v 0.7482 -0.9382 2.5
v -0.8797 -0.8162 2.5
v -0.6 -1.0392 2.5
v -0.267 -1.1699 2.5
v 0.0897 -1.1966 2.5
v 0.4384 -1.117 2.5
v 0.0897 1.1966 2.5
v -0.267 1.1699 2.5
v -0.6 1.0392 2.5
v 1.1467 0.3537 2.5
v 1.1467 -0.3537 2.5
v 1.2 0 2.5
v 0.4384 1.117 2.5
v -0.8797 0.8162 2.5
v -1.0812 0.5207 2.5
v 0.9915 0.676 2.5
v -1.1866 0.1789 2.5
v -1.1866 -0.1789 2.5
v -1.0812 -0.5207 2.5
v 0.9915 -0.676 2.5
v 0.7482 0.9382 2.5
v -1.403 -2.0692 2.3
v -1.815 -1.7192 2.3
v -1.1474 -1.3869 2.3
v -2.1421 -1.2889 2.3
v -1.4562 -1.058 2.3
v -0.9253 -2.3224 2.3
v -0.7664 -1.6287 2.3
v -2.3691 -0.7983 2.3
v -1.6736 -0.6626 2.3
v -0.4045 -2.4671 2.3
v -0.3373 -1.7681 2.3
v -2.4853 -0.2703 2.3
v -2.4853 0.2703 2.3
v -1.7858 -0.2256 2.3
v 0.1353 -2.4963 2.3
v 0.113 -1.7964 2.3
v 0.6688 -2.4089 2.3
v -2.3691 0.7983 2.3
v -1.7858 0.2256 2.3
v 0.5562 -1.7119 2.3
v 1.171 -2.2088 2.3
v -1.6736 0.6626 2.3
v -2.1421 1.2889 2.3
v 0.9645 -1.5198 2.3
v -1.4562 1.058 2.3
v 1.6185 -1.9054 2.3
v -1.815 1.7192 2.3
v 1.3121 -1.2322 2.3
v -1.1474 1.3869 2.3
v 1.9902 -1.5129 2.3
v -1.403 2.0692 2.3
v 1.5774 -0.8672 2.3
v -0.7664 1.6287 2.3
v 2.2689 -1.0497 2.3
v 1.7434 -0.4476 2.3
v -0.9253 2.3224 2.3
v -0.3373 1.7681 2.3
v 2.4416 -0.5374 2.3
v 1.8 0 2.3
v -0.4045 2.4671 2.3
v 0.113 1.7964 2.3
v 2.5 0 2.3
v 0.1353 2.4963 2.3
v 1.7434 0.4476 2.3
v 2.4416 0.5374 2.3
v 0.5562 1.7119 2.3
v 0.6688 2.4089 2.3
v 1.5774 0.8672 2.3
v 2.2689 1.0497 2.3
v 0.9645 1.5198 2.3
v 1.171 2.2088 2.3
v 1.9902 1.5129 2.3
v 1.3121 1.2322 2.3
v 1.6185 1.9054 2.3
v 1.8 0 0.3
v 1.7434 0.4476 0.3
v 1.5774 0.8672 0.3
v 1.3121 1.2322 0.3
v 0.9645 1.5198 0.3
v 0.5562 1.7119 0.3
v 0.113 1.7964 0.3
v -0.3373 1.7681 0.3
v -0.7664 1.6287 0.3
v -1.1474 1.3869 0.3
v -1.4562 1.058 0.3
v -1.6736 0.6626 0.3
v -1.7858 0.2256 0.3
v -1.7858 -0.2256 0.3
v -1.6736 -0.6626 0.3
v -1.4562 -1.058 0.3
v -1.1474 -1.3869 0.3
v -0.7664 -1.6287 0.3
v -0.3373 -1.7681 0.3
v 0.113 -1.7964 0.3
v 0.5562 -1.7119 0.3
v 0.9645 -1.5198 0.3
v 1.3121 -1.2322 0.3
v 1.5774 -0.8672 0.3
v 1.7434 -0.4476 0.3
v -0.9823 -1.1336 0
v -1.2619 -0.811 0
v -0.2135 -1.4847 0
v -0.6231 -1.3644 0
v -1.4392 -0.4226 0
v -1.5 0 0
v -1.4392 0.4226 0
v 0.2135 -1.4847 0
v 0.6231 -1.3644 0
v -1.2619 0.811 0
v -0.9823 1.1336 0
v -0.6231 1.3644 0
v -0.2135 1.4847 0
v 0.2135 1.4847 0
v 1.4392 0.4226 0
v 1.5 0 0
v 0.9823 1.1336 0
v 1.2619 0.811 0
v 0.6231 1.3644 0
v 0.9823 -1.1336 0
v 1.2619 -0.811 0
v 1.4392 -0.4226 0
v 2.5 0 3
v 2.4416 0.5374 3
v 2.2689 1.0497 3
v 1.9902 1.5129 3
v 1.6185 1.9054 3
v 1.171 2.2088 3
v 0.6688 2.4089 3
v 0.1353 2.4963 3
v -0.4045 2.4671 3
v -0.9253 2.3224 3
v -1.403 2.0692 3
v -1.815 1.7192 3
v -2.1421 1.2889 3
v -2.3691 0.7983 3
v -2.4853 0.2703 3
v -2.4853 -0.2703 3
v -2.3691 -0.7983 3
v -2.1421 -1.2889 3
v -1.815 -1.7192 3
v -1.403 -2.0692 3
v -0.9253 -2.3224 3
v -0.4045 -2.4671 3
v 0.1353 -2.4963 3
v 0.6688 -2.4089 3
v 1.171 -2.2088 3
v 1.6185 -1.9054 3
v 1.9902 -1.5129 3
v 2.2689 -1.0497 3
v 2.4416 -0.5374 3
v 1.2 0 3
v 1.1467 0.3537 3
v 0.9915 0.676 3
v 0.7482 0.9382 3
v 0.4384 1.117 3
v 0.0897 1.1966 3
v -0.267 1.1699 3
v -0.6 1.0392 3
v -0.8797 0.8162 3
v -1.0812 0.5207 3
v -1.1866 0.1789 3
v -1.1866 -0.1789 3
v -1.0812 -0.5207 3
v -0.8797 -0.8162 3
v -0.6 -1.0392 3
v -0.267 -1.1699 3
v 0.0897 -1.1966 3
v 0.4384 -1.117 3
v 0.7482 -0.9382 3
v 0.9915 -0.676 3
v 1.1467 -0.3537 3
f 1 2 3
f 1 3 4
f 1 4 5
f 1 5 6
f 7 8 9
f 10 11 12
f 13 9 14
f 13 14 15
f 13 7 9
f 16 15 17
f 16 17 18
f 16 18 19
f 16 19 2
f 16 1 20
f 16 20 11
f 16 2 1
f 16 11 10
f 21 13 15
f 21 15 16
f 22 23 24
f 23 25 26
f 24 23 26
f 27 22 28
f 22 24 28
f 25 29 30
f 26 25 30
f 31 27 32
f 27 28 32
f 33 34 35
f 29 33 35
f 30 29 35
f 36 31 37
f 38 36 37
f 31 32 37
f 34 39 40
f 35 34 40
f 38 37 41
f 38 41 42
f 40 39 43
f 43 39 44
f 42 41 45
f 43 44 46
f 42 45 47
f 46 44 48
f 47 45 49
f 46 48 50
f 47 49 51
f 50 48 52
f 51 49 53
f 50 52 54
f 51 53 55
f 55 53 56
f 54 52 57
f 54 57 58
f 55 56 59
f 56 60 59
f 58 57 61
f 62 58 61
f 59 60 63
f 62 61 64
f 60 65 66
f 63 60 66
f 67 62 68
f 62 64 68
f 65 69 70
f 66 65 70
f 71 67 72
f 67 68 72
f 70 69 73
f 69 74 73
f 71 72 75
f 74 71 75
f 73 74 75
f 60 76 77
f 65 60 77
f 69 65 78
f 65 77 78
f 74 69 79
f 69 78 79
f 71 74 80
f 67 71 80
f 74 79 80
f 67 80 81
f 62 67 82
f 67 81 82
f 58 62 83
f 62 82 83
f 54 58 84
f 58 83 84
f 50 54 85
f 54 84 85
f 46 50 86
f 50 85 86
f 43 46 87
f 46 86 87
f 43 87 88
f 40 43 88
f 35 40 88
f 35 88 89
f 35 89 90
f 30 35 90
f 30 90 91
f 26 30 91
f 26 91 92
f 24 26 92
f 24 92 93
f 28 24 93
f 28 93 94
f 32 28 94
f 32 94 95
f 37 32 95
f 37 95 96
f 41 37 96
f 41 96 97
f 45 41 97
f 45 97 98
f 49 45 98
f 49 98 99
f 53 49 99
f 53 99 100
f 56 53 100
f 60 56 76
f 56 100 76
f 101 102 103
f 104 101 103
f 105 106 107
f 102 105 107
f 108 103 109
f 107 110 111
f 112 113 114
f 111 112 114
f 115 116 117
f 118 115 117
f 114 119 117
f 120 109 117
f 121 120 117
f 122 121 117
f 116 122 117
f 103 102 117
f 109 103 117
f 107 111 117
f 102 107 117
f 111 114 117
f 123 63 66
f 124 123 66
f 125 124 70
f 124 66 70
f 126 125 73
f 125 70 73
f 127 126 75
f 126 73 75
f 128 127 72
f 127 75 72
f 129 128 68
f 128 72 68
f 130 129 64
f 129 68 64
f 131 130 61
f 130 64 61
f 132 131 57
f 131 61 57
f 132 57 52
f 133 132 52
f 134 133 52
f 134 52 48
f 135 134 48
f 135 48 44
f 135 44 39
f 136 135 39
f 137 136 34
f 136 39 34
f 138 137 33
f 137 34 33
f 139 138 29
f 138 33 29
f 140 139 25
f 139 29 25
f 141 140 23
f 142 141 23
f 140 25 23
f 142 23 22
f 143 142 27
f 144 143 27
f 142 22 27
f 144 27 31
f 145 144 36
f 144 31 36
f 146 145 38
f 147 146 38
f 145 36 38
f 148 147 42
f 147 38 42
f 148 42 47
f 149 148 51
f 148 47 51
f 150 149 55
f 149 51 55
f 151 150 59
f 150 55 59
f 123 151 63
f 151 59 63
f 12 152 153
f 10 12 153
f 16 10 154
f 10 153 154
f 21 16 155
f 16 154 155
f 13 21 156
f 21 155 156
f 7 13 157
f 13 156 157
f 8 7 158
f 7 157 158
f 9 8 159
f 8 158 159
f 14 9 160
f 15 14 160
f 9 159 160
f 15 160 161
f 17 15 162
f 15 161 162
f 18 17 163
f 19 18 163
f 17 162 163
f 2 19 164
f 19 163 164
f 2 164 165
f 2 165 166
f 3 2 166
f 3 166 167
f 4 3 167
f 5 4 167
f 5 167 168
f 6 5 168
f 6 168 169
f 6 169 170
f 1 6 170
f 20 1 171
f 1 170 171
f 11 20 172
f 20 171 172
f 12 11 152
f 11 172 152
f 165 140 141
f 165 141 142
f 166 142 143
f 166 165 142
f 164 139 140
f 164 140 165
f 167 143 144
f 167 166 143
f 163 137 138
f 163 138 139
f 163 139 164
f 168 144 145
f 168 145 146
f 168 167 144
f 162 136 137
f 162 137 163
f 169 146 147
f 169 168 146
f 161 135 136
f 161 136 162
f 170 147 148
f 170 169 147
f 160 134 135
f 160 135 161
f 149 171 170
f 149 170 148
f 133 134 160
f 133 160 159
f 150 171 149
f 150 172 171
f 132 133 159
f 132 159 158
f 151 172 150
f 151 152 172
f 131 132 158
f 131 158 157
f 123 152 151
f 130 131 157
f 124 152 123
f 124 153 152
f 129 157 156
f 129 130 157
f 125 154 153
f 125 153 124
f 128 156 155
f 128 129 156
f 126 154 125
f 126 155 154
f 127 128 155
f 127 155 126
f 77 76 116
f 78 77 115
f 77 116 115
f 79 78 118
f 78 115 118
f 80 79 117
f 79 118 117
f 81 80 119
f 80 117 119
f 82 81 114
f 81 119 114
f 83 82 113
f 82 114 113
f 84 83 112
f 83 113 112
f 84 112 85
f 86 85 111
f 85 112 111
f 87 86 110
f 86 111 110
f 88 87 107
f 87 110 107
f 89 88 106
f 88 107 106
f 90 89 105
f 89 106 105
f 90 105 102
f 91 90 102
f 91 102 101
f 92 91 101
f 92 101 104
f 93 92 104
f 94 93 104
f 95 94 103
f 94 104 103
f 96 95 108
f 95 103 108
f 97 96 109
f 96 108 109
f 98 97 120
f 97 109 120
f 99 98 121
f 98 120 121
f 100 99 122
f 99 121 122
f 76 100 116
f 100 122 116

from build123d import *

# Parameters (mm, degrees)
SKETCH_1_R          = 1.8
EXTRUDE_1_DEPTH     = 3
EXTRUDE_START       = -0.7
SKETCH_2_R          = 2.5
SKETCH_2_R_2        = 1.8
EXTRUDE_2_DEPTH     = 0.7
SKETCH_3_R          = 1.2
CUT_EXTRUDE_1_DEPTH = 0.5
CHAMFER_1_SIZE      = 0.3


with BuildPart() as part:
    # 草图1 → 凸台-拉伸1 (new body)
    with BuildSketch(Plane.XY):
        Circle(SKETCH_1_R)
    extrude(amount=EXTRUDE_1_DEPTH)

    # 草图2 → 凸台-拉伸2 (add)
    with BuildSketch(Plane.XY.offset(3).offset(EXTRUDE_START)):
        Circle(SKETCH_2_R)
        Circle(SKETCH_2_R_2, mode=Mode.SUBTRACT)
    extrude(amount=EXTRUDE_2_DEPTH)

    # 草图3 → 切除-拉伸1 (cut)
    with BuildSketch(Plane.XY.offset(3)):
        Circle(SKETCH_3_R)
    extrude(amount=-CUT_EXTRUDE_1_DEPTH, mode=Mode.SUBTRACT)

    # 倒角1
    chamfer_1_edges = [part.edges().sort_by_distance(p)[0] for p in [
        (-1.8, 0, 0),
    ]]
    chamfer(chamfer_1_edges, length=CHAMFER_1_SIZE)


solid = part.part
